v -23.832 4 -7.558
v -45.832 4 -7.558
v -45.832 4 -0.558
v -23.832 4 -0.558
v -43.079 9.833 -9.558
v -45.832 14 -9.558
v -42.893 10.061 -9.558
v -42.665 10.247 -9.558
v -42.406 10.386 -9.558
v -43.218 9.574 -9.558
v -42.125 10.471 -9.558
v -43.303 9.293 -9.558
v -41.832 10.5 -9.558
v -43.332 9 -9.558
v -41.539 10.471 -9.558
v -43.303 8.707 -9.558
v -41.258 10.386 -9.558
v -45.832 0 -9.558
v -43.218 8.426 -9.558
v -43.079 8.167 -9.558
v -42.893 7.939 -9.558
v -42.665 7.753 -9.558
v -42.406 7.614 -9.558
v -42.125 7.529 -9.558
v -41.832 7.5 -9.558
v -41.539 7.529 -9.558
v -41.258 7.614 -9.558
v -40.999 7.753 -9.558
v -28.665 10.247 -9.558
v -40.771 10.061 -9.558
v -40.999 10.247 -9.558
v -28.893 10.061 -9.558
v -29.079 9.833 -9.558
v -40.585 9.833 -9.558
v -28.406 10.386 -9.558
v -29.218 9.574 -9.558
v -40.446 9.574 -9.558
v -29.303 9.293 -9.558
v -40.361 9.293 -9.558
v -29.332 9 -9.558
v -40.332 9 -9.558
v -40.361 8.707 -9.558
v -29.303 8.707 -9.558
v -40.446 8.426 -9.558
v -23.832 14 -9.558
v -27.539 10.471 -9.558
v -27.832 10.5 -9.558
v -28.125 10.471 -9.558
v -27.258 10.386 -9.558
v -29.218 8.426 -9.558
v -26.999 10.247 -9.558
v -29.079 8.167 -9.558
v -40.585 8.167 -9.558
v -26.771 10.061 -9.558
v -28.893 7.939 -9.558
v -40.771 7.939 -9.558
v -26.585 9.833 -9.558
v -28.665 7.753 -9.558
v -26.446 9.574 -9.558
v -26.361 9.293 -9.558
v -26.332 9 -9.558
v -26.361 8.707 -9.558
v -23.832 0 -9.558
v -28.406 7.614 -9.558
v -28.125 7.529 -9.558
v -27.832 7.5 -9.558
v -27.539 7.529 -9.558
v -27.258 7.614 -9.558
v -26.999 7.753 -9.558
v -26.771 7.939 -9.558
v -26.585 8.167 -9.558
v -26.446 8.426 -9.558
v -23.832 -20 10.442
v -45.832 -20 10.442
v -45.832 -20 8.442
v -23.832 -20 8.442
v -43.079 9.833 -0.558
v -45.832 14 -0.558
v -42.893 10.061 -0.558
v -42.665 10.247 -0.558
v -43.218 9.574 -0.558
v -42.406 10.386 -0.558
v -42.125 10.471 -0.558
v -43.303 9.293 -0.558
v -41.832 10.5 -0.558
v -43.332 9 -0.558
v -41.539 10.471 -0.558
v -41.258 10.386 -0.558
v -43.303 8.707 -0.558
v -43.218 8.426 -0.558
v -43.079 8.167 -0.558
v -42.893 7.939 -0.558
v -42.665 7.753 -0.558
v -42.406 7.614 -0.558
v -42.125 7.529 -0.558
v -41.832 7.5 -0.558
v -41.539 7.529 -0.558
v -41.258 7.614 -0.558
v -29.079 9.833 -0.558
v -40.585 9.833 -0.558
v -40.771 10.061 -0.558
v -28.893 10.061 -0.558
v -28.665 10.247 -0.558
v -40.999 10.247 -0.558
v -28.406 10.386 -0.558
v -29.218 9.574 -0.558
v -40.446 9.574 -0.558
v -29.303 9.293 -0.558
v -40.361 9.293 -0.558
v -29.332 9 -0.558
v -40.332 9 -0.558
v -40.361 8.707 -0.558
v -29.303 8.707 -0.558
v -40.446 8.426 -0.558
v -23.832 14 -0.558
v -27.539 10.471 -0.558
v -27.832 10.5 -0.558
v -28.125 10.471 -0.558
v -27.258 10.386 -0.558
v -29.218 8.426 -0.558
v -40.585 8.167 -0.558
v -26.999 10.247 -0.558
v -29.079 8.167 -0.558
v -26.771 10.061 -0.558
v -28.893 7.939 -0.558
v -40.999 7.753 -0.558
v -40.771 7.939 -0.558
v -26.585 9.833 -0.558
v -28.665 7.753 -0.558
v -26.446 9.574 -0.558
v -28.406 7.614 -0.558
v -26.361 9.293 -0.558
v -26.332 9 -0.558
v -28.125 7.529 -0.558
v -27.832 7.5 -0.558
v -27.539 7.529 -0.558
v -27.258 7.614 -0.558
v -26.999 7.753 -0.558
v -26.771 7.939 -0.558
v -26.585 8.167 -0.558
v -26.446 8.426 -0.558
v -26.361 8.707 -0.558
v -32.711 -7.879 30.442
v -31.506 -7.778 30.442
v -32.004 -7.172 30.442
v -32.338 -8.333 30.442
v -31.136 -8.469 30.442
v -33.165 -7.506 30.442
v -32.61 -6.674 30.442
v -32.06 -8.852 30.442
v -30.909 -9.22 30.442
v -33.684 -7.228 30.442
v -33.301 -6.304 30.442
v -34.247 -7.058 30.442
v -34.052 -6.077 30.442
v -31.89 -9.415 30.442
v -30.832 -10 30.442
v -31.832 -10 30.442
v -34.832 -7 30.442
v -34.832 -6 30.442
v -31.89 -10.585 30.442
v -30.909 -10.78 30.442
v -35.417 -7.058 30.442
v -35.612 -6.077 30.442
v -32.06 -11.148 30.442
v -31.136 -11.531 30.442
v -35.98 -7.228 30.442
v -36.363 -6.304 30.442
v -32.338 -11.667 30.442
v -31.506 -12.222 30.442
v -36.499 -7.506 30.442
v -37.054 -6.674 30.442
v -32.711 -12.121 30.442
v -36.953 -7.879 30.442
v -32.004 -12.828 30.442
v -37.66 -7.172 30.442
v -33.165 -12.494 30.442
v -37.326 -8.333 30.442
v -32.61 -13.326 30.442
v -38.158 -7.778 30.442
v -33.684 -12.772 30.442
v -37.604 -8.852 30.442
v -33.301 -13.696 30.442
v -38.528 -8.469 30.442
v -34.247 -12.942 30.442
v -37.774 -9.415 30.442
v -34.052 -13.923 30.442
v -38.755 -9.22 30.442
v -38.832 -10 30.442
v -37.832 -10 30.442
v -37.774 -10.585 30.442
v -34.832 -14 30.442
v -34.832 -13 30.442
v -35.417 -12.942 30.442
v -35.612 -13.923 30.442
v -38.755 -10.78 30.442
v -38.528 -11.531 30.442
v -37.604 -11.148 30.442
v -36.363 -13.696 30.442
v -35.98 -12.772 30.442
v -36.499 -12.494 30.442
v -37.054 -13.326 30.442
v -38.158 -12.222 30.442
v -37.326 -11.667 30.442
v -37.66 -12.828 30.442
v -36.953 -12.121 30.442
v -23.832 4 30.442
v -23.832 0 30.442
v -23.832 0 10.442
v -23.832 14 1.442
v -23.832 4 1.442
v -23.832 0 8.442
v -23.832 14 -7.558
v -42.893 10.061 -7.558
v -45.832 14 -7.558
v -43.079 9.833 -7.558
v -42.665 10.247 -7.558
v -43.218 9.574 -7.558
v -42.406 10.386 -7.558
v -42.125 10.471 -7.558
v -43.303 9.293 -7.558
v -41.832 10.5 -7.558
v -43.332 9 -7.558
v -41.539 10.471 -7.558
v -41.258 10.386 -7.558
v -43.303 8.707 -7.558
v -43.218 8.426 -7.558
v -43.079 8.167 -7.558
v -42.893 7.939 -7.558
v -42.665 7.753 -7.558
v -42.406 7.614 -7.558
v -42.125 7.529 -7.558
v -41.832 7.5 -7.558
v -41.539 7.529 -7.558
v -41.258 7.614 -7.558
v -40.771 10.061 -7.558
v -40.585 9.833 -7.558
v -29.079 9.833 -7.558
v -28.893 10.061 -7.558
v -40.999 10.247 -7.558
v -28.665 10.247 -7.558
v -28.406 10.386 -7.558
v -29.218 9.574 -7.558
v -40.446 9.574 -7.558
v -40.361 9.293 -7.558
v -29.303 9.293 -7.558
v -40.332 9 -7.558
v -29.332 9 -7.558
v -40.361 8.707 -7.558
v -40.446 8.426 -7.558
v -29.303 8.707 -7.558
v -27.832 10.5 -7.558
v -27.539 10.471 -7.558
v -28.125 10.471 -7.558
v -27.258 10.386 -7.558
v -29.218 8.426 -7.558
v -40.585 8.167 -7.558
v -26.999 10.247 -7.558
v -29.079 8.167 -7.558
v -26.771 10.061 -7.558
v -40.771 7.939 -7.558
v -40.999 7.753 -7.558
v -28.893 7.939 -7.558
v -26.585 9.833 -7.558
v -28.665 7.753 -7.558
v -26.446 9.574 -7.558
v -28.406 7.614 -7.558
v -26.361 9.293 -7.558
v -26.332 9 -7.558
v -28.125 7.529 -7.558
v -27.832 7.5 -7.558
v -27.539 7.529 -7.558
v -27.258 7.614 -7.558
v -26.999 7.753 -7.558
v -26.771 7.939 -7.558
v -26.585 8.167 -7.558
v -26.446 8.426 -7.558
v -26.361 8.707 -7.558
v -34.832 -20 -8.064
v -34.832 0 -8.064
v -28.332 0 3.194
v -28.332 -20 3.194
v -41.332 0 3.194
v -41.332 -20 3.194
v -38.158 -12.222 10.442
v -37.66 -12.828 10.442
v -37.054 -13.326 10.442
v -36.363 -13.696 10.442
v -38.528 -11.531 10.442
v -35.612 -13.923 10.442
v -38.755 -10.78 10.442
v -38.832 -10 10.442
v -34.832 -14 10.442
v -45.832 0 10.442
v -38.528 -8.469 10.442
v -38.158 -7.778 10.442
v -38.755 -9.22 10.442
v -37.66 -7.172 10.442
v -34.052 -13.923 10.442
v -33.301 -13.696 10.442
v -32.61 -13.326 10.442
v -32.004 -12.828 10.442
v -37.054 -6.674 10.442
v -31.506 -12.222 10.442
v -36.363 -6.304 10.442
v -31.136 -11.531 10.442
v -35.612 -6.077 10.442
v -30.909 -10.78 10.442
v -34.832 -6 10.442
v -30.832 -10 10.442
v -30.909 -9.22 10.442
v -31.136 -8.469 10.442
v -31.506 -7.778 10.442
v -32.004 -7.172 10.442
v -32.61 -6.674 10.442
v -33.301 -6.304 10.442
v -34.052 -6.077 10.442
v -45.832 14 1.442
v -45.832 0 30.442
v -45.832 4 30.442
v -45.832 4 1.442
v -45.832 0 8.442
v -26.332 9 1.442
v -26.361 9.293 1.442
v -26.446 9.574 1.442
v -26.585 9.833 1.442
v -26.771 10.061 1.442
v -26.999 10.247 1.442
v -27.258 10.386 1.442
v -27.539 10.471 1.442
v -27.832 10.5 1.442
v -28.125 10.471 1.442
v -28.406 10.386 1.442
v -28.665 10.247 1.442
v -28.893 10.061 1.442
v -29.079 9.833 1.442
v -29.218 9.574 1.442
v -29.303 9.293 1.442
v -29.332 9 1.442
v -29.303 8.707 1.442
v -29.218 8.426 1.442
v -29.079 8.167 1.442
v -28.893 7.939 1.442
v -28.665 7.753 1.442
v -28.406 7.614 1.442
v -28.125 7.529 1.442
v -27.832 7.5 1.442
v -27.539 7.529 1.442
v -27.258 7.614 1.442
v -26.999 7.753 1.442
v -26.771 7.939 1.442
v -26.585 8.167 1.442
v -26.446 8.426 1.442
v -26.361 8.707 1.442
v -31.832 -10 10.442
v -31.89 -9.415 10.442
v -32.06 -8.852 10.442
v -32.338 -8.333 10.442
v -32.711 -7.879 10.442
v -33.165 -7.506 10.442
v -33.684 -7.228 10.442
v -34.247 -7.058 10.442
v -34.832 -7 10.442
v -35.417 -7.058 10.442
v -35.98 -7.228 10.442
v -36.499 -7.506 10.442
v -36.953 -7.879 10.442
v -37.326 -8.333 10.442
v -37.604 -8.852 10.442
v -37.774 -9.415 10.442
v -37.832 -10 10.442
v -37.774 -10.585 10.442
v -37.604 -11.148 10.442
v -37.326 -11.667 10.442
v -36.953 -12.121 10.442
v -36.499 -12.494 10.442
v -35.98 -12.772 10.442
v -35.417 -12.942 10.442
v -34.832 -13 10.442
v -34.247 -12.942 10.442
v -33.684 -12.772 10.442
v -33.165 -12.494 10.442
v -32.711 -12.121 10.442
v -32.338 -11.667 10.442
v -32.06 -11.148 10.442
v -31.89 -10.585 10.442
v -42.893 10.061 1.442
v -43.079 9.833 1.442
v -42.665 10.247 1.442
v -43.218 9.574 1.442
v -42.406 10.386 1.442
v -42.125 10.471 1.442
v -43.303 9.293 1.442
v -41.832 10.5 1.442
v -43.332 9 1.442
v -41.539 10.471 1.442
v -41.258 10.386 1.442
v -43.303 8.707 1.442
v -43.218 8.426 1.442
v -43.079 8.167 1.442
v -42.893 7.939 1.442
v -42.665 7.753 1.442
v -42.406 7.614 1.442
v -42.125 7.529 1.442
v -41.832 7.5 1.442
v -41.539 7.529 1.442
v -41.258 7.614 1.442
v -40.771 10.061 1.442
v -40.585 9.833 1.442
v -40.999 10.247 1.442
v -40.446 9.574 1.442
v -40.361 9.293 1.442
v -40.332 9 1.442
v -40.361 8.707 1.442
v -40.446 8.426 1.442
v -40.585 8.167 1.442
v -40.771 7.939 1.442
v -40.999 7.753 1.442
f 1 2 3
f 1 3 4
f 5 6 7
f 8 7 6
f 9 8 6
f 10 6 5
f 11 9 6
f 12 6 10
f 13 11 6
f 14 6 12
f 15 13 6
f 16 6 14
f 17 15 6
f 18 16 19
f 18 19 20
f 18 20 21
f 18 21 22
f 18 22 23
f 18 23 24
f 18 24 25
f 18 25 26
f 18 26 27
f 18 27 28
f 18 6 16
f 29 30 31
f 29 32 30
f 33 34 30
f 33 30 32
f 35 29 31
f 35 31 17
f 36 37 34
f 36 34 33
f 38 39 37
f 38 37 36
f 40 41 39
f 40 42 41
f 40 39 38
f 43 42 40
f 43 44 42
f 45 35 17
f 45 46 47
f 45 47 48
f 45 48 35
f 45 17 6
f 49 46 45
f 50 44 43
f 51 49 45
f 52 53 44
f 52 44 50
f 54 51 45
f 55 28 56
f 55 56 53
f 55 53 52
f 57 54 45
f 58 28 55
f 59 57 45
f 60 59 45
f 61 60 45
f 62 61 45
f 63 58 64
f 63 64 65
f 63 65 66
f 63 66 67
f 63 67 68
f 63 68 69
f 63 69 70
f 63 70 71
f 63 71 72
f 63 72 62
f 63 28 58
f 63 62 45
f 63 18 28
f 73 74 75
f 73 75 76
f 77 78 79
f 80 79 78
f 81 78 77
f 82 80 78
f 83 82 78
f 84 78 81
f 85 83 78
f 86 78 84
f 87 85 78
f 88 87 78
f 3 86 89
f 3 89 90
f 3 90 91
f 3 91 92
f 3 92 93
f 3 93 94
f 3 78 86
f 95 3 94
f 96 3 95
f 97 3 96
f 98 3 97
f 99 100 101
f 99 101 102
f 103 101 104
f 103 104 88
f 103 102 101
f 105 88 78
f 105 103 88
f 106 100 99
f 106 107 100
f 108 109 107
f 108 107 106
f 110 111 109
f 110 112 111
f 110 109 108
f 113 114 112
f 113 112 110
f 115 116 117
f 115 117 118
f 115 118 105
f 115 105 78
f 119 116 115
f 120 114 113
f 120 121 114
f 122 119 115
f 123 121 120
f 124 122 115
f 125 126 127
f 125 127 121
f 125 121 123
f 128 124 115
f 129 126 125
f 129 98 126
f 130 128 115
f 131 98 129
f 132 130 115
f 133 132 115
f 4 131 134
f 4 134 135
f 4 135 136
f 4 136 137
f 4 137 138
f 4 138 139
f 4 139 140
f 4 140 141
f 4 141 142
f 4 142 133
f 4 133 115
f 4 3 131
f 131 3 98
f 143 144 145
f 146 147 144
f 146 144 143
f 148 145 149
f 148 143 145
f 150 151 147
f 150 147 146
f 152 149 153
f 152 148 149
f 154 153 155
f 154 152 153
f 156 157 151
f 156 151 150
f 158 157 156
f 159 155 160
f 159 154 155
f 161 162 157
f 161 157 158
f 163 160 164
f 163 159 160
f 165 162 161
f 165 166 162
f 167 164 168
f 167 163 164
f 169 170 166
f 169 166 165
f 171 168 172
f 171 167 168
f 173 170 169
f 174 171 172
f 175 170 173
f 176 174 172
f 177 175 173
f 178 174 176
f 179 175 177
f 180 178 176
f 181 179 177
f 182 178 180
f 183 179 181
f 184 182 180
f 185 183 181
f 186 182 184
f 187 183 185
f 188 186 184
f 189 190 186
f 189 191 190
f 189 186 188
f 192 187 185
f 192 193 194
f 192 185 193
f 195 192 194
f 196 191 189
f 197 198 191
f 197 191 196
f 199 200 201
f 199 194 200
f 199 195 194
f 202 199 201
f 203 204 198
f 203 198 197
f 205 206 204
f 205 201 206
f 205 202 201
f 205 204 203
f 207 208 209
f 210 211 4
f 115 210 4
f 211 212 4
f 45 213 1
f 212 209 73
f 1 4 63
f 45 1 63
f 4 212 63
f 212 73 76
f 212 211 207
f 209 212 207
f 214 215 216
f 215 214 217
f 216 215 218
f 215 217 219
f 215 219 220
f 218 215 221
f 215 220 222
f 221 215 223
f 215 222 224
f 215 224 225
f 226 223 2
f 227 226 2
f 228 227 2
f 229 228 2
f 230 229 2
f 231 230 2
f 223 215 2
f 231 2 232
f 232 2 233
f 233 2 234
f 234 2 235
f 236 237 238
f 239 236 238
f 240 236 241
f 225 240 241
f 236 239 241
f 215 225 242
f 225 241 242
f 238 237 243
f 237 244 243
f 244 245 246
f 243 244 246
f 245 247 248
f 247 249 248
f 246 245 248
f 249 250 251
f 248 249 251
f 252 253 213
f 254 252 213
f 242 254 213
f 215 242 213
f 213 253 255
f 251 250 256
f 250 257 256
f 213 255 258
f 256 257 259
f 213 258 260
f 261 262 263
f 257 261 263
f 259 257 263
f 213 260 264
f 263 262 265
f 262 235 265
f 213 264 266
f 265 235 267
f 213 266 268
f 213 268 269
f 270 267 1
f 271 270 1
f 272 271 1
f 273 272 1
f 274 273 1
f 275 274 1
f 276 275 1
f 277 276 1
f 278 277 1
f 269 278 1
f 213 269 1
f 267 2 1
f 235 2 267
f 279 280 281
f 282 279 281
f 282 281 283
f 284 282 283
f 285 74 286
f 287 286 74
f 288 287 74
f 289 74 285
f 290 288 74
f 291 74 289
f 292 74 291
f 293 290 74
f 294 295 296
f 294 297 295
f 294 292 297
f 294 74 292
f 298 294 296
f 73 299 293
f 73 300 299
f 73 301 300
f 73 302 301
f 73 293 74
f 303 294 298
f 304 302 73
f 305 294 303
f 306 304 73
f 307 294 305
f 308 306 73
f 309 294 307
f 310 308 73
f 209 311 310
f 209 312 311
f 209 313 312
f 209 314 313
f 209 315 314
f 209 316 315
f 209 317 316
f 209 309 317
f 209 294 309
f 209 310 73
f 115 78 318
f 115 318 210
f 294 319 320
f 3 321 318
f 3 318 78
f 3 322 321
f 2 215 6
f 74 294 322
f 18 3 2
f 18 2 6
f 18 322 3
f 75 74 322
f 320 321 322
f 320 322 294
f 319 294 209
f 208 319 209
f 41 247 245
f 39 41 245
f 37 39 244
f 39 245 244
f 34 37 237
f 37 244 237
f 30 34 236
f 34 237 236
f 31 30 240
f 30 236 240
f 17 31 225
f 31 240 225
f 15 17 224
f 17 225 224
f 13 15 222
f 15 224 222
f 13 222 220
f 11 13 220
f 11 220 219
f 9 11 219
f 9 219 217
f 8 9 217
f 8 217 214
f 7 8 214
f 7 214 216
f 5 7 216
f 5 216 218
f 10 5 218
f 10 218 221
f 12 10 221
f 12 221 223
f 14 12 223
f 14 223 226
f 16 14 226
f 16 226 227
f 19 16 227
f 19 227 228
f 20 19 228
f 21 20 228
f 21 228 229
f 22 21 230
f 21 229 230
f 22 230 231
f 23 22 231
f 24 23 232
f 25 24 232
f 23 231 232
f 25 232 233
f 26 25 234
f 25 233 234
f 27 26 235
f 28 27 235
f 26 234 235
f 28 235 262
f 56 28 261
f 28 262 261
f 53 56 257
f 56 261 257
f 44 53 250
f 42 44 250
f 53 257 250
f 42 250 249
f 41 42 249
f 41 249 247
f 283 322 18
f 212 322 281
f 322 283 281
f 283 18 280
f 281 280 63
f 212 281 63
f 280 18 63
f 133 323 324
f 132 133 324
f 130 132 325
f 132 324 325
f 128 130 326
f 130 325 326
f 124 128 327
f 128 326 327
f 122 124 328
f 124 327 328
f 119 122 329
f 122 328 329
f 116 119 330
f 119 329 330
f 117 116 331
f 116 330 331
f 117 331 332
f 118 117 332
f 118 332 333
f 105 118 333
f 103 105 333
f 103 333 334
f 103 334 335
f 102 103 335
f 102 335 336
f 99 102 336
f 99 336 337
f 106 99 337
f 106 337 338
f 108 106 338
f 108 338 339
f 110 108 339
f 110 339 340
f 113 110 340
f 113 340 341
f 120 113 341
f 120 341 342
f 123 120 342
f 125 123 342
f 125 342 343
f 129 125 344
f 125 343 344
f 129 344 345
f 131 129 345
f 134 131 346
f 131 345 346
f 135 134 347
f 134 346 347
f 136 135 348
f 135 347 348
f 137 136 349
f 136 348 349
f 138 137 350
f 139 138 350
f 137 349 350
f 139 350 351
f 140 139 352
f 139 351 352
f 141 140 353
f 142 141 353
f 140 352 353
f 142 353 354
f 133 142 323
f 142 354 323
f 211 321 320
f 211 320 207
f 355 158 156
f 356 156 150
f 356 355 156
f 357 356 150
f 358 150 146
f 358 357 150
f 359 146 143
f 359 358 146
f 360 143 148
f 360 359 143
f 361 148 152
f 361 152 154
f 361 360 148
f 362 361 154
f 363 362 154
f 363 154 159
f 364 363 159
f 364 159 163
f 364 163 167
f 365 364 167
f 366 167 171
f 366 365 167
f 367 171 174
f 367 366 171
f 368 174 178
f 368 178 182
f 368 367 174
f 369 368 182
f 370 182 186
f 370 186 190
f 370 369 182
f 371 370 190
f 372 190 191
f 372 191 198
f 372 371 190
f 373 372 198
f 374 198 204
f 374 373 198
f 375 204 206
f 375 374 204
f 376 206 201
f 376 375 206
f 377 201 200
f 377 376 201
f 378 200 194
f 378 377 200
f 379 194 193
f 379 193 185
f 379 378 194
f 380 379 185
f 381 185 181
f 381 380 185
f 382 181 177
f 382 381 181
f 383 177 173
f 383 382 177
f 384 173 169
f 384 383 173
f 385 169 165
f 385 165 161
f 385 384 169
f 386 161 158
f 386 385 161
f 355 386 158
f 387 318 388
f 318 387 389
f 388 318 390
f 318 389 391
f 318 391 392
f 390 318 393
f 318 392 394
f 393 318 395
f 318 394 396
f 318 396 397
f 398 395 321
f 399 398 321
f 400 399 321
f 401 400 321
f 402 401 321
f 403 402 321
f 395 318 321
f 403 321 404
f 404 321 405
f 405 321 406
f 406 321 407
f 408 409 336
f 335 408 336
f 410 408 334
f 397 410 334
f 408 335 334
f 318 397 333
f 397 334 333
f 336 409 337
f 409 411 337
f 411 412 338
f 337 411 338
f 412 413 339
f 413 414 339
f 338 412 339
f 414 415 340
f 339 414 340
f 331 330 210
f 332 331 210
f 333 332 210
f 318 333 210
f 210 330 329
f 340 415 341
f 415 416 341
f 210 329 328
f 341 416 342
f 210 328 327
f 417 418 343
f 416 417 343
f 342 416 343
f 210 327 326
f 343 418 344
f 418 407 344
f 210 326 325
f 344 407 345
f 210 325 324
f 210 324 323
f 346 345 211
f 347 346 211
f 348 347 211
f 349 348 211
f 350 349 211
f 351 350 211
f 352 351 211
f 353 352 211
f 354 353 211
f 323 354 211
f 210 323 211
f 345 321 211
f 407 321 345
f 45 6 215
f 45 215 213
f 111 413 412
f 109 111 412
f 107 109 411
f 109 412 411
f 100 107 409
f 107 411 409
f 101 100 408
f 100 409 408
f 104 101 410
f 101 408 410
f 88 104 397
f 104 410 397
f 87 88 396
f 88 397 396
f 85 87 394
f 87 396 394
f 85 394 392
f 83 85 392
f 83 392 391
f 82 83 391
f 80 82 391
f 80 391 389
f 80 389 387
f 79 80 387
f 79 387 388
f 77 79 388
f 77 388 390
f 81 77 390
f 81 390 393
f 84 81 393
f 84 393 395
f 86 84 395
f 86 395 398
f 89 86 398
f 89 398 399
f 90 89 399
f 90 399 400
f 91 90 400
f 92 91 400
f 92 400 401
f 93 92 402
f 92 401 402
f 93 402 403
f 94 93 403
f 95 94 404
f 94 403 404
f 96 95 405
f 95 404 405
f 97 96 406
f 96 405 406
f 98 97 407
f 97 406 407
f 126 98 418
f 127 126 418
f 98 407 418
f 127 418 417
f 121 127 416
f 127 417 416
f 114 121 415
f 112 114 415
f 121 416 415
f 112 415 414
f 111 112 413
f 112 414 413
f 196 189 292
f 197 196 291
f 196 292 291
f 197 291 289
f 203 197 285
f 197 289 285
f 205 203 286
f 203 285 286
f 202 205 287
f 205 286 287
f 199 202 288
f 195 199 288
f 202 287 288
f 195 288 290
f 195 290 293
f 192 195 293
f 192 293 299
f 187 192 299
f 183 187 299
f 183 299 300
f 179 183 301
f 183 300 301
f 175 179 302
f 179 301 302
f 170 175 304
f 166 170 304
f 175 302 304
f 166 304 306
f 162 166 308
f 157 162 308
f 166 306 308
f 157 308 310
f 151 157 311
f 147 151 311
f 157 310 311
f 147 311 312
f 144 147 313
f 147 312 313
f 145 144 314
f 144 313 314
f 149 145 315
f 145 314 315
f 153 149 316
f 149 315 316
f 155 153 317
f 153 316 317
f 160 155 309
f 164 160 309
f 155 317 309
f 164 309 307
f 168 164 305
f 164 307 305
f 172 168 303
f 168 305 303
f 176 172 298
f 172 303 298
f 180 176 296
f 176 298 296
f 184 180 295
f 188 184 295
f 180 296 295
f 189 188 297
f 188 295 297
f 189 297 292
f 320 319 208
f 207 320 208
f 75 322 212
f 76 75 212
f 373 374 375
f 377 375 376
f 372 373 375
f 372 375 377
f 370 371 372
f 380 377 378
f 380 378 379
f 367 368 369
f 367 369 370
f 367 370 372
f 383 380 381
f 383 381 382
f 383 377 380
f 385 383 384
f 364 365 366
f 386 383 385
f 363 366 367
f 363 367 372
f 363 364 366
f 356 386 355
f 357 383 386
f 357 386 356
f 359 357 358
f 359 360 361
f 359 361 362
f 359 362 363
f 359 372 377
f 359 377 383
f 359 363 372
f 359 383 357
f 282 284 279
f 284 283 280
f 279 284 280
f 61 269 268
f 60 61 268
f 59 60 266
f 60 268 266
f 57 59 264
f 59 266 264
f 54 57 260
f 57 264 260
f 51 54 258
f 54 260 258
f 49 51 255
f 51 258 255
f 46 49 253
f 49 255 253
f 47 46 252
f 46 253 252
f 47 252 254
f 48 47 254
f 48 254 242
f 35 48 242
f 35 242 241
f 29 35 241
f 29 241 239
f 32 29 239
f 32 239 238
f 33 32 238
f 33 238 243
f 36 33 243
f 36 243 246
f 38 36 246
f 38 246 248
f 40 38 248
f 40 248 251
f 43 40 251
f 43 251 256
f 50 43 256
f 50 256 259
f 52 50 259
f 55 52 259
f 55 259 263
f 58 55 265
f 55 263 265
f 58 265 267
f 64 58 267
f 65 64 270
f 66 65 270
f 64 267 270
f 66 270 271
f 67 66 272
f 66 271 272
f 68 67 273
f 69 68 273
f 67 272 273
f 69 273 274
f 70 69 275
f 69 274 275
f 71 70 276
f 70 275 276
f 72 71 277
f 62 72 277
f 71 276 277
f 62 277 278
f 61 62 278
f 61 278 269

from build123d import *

# Parameters (mm, degrees)
SKETCH_2_W          = 22
SKETCH_2_H          = 40
EXTRUDE_1_DEPTH     = 4
SKETCH_3_W          = 22
SKETCH_3_H          = 2
EXTRUDE_2_DEPTH     = 10
SKETCH_4_R          = 1.5
CUT_EXTRUDE_1_DEPTH = 11
SKETCH_5_W          = 22
SKETCH_5_H          = 2
EXTRUDE_3_DEPTH     = 20
SKETCH_6_R          = 4
SKETCH_6_R_2        = 3
EXTRUDE_4_DEPTH     = 20
EXTRUDE_6_DEPTH     = 20


with BuildPart() as part:
    # Эскиз2 → Бобышка-Вытянуть1 (new body)
    with BuildSketch(Plane(origin=(0, 0, 0), x_dir=(1, 0, 0), z_dir=(0, 1, 0))):
        with Locations((-34.831985697, -10.44161698)):
            Rectangle(SKETCH_2_W, SKETCH_2_H)
    extrude(amount=EXTRUDE_1_DEPTH)

    # Эскиз3 → Бобышка-Вытянуть2 (add)
    with BuildSketch(Plane(origin=(0, 4, 0), x_dir=(1, 0, 0), z_dir=(0, 1, 0))):
        with Locations((-34.831985697, 8.55838302)):
            Rectangle(SKETCH_3_W, SKETCH_3_H)
        with Locations((-34.831985697, -0.44161698)):
            Rectangle(SKETCH_3_W, SKETCH_3_H)
    extrude(amount=EXTRUDE_2_DEPTH)

    # Эскиз4 → Вырез-Вытянуть1 (cut)
    with BuildSketch(Plane.XY.offset(1.44161698)):
        with Locations((-41.831985697, 9)):
            Circle(SKETCH_4_R)
        with Locations((-27.831985697, 9)):
            Circle(SKETCH_4_R)
    extrude(amount=-CUT_EXTRUDE_1_DEPTH, mode=Mode.SUBTRACT)

    # Эскиз5 → Бобышка-Вытянуть3 (add)
    with BuildSketch(Plane.XZ):
        with Locations((-34.831985697, 9.44161698)):
            Rectangle(SKETCH_5_W, SKETCH_5_H)
    extrude(amount=EXTRUDE_3_DEPTH)

    # Эскиз6 → Бобышка-Вытянуть4 (add)
    with BuildSketch(Plane.XY.offset(10.44161698)):
        with Locations(Location((-34.831985697, -10, 0), (0, 0, 180))):
            Circle(SKETCH_6_R)
        with Locations((-34.831985697, -10)):
            Circle(SKETCH_6_R_2, mode=Mode.SUBTRACT)
    extrude(amount=EXTRUDE_4_DEPTH)

    # Эскиз8 → Бобышка-Вытянуть6 (add)
    with BuildSketch(Plane.XZ):
        Polygon((-34.831985697, -8.063936519), (-28.331985697, 3.19439373), (-41.331985697, 3.19439373), align=None)
    extrude(amount=EXTRUDE_6_DEPTH)


solid = part.part
